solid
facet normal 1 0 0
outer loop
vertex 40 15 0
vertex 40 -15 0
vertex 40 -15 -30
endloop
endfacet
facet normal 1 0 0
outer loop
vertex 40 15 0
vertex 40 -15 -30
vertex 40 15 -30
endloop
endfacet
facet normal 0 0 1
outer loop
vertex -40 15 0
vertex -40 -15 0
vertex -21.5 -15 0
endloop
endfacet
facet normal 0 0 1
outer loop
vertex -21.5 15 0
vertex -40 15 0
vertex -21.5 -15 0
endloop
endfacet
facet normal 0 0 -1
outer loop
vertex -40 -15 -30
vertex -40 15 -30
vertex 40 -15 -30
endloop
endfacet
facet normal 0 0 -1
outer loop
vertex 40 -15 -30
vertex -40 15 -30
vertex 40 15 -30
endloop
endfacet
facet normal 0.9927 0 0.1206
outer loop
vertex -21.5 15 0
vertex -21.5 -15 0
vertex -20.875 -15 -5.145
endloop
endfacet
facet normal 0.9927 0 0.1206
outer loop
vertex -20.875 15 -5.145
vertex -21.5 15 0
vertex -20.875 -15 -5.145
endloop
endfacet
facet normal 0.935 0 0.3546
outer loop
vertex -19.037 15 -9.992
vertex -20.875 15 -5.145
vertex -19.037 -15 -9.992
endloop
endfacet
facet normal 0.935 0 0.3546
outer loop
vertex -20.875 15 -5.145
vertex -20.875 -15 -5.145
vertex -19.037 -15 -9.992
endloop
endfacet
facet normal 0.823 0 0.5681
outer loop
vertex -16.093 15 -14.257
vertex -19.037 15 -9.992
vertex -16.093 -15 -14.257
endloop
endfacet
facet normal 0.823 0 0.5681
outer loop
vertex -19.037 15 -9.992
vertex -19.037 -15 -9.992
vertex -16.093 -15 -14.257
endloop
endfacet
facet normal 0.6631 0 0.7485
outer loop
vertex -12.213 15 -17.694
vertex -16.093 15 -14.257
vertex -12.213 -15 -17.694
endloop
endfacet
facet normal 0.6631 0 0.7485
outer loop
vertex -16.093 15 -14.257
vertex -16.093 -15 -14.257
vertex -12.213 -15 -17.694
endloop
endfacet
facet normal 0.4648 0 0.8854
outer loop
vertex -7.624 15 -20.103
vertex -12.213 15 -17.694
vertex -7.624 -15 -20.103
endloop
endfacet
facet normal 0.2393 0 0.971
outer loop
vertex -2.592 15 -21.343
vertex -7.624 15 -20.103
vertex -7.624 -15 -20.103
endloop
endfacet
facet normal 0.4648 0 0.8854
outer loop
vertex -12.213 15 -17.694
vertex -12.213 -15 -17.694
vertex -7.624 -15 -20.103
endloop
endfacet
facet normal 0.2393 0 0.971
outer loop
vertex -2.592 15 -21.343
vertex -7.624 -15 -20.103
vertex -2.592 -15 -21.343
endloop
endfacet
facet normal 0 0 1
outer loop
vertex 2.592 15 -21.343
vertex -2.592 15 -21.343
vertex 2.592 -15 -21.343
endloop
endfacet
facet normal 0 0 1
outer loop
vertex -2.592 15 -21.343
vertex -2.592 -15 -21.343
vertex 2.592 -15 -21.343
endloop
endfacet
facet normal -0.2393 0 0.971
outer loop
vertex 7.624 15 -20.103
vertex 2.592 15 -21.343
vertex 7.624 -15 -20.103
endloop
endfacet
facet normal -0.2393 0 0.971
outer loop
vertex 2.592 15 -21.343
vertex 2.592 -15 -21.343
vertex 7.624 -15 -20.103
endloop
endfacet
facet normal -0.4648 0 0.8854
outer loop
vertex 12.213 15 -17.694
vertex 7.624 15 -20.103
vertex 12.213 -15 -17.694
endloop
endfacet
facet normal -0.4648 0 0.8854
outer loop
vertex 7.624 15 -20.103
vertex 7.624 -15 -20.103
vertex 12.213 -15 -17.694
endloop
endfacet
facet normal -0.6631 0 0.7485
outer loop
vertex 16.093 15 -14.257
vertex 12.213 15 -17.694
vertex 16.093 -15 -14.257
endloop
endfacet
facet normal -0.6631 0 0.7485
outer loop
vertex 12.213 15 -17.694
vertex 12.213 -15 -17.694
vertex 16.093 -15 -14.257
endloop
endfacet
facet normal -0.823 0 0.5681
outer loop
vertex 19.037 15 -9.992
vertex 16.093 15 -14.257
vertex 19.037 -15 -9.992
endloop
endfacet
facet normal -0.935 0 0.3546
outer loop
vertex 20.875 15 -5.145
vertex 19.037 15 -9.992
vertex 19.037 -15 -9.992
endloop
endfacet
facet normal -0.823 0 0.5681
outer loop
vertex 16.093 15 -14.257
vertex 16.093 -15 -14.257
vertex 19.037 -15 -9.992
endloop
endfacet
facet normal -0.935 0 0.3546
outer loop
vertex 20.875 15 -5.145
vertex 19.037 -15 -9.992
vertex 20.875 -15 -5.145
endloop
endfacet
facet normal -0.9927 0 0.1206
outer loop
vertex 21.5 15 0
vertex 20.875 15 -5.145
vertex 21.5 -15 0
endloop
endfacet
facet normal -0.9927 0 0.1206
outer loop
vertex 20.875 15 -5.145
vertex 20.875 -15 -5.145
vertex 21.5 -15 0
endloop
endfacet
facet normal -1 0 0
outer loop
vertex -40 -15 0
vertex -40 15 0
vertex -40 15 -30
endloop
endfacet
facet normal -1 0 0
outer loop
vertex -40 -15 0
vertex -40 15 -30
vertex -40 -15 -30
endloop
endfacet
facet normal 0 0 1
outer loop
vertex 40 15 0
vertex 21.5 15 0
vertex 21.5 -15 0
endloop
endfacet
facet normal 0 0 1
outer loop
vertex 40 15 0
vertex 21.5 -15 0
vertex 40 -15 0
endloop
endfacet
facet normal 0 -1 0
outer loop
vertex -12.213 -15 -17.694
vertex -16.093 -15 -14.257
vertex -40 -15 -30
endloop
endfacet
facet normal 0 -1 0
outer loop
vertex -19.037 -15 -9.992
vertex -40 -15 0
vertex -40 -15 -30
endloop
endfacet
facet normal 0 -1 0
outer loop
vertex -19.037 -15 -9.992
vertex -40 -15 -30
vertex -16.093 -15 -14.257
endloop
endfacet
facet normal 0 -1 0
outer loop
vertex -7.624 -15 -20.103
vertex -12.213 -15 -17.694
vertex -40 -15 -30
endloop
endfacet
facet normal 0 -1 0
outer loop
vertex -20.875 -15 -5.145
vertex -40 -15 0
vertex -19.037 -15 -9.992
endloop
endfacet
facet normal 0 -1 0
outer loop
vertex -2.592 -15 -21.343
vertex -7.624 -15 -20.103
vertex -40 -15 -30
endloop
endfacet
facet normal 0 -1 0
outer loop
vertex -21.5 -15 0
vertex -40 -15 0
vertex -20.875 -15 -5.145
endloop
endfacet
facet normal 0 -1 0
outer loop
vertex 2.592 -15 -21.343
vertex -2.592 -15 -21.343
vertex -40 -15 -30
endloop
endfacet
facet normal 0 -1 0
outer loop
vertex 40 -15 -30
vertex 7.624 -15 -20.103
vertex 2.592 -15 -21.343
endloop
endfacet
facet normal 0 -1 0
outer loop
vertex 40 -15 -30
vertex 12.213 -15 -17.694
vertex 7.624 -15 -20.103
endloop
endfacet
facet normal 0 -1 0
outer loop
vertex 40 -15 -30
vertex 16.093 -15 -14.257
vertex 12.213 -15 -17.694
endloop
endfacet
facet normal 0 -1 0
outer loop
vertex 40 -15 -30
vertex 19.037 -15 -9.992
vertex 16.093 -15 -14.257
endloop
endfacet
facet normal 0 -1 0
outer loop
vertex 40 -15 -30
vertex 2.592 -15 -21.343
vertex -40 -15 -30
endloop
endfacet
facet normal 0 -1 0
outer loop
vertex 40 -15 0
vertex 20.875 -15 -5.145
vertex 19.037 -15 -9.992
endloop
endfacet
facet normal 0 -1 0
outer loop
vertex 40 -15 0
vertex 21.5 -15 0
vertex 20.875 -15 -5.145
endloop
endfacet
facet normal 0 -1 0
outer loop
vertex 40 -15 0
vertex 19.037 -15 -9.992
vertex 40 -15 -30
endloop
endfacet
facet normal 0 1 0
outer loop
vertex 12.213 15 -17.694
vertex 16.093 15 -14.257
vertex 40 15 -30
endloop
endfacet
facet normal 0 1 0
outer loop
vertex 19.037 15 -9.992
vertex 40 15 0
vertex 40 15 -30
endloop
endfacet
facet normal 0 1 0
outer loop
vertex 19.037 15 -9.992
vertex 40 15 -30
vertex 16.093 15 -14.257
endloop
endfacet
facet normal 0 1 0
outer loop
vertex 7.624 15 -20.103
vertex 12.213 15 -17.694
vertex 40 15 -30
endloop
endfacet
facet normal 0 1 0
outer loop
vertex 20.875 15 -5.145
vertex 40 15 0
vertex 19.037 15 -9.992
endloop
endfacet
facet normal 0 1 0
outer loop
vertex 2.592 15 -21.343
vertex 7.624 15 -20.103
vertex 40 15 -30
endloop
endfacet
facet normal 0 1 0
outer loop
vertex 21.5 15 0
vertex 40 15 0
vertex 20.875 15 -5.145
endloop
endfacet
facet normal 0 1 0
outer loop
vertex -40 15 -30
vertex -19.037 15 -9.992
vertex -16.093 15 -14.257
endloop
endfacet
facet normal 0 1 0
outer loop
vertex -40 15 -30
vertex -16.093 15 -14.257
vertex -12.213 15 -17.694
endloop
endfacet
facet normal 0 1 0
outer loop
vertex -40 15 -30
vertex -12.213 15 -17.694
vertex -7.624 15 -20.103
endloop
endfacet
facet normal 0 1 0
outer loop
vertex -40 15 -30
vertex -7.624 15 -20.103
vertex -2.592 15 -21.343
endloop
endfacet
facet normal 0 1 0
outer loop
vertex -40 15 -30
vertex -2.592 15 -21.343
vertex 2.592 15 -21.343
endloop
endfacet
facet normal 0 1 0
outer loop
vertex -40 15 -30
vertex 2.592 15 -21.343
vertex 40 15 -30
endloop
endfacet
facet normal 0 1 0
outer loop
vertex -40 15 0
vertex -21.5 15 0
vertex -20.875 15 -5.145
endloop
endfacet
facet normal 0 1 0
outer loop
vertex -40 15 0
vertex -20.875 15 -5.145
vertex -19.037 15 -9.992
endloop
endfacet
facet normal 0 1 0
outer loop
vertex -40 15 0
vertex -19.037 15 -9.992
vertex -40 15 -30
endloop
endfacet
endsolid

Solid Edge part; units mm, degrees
sketch "Sketch1" plane through (0, 0, 0) normal (0, 0, 1) x (1, 0, 0)
  line L0 (-40, -15) -> (40, -15)
  line L1 (40, -15) -> (40, 15)
  line L2 (40, 15) -> (-40, 15)
  line L3 (-40, 15) -> (-40, -15)
extrude "Protrusion1" add sketch "Sketch1" against normal blind 30
sketch "Sketch2" plane through (0, -15, -15) normal (0, -1, 0) x (1, 0, 0)
  circle A0 centre (0, 15) radius 21.5
extrude "Recorte_Extrudado_1" cut sketch "Sketch2" against normal blind 30
